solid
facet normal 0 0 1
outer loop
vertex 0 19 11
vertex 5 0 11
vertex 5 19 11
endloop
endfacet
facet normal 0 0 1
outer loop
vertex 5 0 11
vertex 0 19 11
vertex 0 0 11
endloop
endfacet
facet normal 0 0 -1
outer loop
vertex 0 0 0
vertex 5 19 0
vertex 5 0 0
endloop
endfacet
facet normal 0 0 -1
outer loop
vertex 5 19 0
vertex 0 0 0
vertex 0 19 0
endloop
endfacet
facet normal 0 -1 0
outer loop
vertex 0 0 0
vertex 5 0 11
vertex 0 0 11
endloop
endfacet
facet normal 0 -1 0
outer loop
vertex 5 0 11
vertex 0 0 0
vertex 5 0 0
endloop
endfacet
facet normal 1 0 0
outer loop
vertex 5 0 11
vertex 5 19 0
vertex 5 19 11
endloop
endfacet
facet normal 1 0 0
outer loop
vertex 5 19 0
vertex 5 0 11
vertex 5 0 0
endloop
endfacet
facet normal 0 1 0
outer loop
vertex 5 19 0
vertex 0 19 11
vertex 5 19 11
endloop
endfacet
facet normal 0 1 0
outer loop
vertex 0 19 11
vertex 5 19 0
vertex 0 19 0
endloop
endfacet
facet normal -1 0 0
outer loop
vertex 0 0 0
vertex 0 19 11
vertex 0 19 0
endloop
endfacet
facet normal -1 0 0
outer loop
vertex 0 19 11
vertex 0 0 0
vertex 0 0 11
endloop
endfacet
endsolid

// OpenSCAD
// Generated by SolidPython 1.0.1 on 2020-07-29 00:46:54


cube(size = [5, 19, 11]);
/***********************************************
*********      SolidPython code:      **********
************************************************
 
# import packages: SolidPython
from solid import *
from solid.utils import *
from itertools import chain, combinations, permutations


class Resize:

    def __init__(self, scad_file):
        self.scad_file = scad_file
        #self.scad_file = import_scad(scad_file)
        # cone/cylinder param:
        self.r1 = 0
        self.r2 = 0
        self.h = 0
        # rectangular prism param:
        self.w = 0
        self.l = 0
        # ellipse param:
        self.r = 0

    # import OpenScad code (file name corresponds to shape)


    # classify shape + parameters
    def assign(self, param1, param2, param3):
        if self.scad_file == 'cone.scad':
            self.r1 = param1
            self.r2 = param2
            self.h = param3
        elif self.scad_file == 'cylinder.scad':
            self.r1 = param1
            self.r2 = param2
            self.h = param3
        elif self.scad_file == 'rectangularPrism.scad':
            self.h = param1
            self.l = param2
            self.w = param3
        else:
            self.r = param1
            self.h = param2

    # resize parameters
    def iterate(self):
        x = range(3, 20, 2)
        i = 1
        if self.scad_file == 'cone.scad':
            tempList = list(permutations(x, 2))
            for temp in tempList:
                param1 = temp[0]
                param2 = temp[1]
                filepath = 'produced_scad_files/' + 'cone' + str(param1) + '_' + str(param2) + '_' + '.scad'
                scad_render_to_file(cylinder(h=param1, r1=param2, r2=0), filepath)

        elif self.scad_file == 'cylinder.scad':
            tempList = list(permutations(x, 3))
            for temp in tempList:
                param1 = temp[0]
                param2 = temp[1]
                filepath = 'produced_scad_files/' + 'cylinder' + str(param1) + '_' + str(param2) + '_' + '.scad'
                scad_render_to_file(cylinder(h=param1, r1=param2, r2=param2), filepath)

        elif self.scad_file == 'rectangularPrism.scad':
            tempList = list(permutations(x, 3))
            for temp in tempList:
                param1 = temp[0]
                param2 = temp[1]
                param3 = temp[2]
                filepath = 'produced_scad_files/' + 'rectangularPrism' + str(param1) + '_' + str(param2) + '_' + str(
                    param3) + '.scad'
                scad_render_to_file(cube(size=(param1, param2, param3)), filepath)

        elif self.scad_file == 'ellipse.scad':
            tempList = list(permutations(x, 4))
            for temp in tempList:
                param1 = temp[0]
                param2 = temp[1]
                param3 = temp[2]
                param4 = temp[3]
                filepath = 'produced_scad_files/' + 'ellipse' + str(param1) + '_' + str(param2) + '_' + str(param3) + '_' + str(param4) + '.scad'
                scad_render_to_file(scale([param1, param2, param3])(sphere(r=param4)), filepath)

    def render_to_scadfile(self):
        scad_render_to_file(scad, 'example.scad') 
 
************************************************/
